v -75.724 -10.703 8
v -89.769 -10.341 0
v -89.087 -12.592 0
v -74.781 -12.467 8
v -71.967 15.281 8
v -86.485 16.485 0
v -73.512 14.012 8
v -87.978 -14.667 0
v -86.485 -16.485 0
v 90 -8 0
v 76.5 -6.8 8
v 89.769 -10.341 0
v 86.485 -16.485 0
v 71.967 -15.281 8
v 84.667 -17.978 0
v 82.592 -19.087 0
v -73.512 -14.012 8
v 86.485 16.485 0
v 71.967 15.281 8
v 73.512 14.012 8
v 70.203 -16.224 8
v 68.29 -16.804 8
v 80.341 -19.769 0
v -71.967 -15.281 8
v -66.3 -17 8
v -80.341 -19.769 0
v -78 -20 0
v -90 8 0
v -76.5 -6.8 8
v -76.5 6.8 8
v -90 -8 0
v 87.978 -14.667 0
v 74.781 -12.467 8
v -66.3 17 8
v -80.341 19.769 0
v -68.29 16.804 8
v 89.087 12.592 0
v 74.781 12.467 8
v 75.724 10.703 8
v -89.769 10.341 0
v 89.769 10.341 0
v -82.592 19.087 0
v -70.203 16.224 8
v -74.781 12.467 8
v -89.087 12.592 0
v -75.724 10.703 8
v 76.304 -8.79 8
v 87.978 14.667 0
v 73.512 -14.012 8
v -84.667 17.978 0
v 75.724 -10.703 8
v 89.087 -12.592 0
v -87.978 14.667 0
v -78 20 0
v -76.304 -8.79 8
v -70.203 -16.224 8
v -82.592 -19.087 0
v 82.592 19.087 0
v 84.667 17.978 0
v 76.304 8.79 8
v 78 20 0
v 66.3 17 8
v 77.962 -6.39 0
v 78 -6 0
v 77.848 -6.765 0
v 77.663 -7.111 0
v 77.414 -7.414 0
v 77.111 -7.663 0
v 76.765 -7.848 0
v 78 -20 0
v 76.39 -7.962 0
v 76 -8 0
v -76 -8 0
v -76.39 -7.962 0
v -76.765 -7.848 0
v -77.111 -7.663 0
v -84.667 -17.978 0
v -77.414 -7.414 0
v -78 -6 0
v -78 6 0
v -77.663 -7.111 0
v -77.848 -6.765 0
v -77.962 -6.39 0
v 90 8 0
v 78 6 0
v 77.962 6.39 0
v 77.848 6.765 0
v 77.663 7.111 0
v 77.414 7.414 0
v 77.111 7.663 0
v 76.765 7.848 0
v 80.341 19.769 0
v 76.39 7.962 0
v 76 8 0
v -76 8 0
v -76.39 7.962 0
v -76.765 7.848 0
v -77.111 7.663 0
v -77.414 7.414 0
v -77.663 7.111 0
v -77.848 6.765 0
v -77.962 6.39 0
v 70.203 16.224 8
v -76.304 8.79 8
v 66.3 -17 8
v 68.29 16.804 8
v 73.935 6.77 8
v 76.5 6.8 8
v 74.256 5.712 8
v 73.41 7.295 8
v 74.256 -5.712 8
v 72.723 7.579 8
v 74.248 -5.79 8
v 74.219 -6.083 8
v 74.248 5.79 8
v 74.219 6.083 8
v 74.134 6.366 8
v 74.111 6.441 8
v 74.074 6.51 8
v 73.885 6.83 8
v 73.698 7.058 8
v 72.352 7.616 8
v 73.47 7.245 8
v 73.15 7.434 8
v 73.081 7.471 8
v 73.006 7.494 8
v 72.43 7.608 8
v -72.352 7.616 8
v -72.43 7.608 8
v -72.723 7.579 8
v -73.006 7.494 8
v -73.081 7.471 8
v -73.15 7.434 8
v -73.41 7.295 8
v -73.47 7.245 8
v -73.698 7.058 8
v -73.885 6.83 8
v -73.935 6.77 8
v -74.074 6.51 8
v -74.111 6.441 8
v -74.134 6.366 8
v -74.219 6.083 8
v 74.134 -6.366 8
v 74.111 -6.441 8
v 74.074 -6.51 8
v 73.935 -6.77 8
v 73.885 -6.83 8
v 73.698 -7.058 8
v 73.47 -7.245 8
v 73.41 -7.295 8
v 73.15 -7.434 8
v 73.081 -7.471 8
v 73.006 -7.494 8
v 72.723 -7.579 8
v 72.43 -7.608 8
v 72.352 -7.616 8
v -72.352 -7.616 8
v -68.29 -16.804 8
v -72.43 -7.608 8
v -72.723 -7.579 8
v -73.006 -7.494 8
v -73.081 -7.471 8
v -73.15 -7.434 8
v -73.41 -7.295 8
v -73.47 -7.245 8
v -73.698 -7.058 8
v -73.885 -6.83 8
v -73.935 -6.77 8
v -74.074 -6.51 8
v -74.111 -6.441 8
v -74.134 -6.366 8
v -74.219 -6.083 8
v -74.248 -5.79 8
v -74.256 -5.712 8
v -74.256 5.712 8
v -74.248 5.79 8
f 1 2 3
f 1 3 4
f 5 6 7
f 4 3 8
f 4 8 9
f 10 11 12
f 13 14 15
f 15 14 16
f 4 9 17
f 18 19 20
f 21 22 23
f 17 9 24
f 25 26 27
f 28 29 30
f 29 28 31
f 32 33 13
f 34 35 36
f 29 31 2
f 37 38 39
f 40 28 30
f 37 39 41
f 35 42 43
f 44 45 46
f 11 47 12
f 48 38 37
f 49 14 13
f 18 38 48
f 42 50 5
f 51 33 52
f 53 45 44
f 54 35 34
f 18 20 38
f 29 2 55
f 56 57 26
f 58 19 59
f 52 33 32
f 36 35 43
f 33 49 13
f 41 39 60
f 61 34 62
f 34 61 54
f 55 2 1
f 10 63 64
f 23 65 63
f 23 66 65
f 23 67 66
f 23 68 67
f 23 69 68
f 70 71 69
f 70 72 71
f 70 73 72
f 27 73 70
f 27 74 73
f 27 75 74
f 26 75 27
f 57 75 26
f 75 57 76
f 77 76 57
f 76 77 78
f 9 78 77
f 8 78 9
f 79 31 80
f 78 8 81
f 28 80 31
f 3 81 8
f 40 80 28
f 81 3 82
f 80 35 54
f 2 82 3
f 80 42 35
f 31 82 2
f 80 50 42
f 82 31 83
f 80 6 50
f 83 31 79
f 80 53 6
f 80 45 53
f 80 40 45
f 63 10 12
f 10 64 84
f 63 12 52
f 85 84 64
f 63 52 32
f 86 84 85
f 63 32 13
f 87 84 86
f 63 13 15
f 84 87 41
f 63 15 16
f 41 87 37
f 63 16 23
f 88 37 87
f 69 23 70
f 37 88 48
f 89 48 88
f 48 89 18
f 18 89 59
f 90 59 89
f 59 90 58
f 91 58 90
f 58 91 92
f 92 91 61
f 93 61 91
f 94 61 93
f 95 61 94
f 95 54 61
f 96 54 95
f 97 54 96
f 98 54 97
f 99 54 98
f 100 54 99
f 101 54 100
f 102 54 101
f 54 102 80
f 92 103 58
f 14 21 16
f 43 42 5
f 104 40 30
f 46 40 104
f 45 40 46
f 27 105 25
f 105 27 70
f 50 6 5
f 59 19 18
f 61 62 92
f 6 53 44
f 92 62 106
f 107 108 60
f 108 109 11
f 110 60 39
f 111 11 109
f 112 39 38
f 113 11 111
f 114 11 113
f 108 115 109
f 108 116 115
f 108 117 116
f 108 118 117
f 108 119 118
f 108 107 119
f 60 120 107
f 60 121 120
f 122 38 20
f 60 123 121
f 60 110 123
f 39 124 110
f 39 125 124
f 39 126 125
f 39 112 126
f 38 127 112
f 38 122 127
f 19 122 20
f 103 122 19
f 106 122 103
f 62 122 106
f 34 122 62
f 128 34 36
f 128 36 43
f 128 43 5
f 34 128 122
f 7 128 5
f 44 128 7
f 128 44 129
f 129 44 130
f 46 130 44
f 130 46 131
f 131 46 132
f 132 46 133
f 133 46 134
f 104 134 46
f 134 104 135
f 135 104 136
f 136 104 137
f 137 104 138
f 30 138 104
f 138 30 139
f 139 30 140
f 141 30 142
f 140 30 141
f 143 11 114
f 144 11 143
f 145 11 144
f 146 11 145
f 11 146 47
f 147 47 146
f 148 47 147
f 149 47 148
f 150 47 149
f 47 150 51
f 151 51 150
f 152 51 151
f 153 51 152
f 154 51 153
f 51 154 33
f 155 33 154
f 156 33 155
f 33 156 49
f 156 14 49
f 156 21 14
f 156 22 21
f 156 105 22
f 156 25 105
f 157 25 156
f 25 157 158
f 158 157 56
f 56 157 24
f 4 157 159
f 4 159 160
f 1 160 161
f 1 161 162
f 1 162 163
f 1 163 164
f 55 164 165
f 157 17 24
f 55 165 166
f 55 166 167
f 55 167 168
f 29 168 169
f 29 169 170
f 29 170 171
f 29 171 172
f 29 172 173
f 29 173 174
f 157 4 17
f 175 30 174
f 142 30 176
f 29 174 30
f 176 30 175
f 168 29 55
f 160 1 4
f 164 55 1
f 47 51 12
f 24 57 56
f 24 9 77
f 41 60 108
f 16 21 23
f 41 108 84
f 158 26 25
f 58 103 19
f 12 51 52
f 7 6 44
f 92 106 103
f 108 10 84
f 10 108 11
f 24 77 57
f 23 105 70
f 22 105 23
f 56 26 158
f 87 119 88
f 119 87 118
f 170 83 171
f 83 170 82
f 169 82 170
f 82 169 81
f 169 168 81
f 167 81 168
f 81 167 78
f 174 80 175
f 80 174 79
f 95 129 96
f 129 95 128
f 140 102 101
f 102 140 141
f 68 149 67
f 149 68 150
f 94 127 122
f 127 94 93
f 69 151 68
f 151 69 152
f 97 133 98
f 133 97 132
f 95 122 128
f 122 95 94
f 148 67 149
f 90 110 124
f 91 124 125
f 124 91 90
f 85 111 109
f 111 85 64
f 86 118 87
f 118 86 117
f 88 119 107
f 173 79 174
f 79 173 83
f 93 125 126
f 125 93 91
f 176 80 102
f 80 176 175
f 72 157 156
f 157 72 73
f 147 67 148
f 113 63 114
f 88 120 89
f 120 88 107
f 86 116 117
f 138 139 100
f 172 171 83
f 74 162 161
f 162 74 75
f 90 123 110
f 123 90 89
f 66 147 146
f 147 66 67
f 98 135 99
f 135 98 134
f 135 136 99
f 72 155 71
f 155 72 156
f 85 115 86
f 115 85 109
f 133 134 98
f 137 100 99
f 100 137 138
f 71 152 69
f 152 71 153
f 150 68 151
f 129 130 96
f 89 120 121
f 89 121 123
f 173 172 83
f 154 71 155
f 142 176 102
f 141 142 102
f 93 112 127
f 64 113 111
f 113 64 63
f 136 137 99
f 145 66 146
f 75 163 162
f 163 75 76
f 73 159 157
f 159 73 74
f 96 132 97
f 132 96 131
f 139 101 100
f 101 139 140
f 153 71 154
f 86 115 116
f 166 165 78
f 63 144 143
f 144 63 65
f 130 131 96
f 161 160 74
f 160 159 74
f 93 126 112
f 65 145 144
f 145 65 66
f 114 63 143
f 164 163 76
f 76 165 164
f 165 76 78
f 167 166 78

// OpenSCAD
$fn = 32;

// ----------------------------------------------------------------------
// Display bezel: 180 x 40 mm frame, opening 156x16 mm
// ----------------------------------------------------------------------

// --- parameters (mm) ---
length = 180;             // frame outside length, X
width = 40;               // frame outside width, Y
frame_w = 12;             // frame width
thickness = 8;            // frame thickness
corner_r = 12;            // outside corner radius
chamfer = 0.85;           // outer wall taper
funnel = 0.94;            // inner opening taper
opening_l = 156;          // opening length
opening_w = 16;           // opening width
inner_r = 2;              // opening corner radius

/* rounded-rectangle outlines, generated with loops */
module rounded_ring(l_nom, w_nom, r) {
  hull() {
    for (sx = [-1, 1]) for (sy = [-1, 1])
      translate([sx * (l_nom / 2 - r), sy * (w_nom / 2 - r)]) circle(r = r);
  }
}

difference() {
  /* frame body, drafted so the outer edge is a variable-depth chamfer */
  linear_extrude(height = thickness, scale = chamfer)
    rounded_ring(length, width, corner_r);
  /* viewing opening, drafted the other way for a funnel edge */
  linear_extrude(height = thickness + 2, scale = funnel)
    translate([0, 0, -1]) rounded_ring(opening_l, opening_w, inner_r);
}
